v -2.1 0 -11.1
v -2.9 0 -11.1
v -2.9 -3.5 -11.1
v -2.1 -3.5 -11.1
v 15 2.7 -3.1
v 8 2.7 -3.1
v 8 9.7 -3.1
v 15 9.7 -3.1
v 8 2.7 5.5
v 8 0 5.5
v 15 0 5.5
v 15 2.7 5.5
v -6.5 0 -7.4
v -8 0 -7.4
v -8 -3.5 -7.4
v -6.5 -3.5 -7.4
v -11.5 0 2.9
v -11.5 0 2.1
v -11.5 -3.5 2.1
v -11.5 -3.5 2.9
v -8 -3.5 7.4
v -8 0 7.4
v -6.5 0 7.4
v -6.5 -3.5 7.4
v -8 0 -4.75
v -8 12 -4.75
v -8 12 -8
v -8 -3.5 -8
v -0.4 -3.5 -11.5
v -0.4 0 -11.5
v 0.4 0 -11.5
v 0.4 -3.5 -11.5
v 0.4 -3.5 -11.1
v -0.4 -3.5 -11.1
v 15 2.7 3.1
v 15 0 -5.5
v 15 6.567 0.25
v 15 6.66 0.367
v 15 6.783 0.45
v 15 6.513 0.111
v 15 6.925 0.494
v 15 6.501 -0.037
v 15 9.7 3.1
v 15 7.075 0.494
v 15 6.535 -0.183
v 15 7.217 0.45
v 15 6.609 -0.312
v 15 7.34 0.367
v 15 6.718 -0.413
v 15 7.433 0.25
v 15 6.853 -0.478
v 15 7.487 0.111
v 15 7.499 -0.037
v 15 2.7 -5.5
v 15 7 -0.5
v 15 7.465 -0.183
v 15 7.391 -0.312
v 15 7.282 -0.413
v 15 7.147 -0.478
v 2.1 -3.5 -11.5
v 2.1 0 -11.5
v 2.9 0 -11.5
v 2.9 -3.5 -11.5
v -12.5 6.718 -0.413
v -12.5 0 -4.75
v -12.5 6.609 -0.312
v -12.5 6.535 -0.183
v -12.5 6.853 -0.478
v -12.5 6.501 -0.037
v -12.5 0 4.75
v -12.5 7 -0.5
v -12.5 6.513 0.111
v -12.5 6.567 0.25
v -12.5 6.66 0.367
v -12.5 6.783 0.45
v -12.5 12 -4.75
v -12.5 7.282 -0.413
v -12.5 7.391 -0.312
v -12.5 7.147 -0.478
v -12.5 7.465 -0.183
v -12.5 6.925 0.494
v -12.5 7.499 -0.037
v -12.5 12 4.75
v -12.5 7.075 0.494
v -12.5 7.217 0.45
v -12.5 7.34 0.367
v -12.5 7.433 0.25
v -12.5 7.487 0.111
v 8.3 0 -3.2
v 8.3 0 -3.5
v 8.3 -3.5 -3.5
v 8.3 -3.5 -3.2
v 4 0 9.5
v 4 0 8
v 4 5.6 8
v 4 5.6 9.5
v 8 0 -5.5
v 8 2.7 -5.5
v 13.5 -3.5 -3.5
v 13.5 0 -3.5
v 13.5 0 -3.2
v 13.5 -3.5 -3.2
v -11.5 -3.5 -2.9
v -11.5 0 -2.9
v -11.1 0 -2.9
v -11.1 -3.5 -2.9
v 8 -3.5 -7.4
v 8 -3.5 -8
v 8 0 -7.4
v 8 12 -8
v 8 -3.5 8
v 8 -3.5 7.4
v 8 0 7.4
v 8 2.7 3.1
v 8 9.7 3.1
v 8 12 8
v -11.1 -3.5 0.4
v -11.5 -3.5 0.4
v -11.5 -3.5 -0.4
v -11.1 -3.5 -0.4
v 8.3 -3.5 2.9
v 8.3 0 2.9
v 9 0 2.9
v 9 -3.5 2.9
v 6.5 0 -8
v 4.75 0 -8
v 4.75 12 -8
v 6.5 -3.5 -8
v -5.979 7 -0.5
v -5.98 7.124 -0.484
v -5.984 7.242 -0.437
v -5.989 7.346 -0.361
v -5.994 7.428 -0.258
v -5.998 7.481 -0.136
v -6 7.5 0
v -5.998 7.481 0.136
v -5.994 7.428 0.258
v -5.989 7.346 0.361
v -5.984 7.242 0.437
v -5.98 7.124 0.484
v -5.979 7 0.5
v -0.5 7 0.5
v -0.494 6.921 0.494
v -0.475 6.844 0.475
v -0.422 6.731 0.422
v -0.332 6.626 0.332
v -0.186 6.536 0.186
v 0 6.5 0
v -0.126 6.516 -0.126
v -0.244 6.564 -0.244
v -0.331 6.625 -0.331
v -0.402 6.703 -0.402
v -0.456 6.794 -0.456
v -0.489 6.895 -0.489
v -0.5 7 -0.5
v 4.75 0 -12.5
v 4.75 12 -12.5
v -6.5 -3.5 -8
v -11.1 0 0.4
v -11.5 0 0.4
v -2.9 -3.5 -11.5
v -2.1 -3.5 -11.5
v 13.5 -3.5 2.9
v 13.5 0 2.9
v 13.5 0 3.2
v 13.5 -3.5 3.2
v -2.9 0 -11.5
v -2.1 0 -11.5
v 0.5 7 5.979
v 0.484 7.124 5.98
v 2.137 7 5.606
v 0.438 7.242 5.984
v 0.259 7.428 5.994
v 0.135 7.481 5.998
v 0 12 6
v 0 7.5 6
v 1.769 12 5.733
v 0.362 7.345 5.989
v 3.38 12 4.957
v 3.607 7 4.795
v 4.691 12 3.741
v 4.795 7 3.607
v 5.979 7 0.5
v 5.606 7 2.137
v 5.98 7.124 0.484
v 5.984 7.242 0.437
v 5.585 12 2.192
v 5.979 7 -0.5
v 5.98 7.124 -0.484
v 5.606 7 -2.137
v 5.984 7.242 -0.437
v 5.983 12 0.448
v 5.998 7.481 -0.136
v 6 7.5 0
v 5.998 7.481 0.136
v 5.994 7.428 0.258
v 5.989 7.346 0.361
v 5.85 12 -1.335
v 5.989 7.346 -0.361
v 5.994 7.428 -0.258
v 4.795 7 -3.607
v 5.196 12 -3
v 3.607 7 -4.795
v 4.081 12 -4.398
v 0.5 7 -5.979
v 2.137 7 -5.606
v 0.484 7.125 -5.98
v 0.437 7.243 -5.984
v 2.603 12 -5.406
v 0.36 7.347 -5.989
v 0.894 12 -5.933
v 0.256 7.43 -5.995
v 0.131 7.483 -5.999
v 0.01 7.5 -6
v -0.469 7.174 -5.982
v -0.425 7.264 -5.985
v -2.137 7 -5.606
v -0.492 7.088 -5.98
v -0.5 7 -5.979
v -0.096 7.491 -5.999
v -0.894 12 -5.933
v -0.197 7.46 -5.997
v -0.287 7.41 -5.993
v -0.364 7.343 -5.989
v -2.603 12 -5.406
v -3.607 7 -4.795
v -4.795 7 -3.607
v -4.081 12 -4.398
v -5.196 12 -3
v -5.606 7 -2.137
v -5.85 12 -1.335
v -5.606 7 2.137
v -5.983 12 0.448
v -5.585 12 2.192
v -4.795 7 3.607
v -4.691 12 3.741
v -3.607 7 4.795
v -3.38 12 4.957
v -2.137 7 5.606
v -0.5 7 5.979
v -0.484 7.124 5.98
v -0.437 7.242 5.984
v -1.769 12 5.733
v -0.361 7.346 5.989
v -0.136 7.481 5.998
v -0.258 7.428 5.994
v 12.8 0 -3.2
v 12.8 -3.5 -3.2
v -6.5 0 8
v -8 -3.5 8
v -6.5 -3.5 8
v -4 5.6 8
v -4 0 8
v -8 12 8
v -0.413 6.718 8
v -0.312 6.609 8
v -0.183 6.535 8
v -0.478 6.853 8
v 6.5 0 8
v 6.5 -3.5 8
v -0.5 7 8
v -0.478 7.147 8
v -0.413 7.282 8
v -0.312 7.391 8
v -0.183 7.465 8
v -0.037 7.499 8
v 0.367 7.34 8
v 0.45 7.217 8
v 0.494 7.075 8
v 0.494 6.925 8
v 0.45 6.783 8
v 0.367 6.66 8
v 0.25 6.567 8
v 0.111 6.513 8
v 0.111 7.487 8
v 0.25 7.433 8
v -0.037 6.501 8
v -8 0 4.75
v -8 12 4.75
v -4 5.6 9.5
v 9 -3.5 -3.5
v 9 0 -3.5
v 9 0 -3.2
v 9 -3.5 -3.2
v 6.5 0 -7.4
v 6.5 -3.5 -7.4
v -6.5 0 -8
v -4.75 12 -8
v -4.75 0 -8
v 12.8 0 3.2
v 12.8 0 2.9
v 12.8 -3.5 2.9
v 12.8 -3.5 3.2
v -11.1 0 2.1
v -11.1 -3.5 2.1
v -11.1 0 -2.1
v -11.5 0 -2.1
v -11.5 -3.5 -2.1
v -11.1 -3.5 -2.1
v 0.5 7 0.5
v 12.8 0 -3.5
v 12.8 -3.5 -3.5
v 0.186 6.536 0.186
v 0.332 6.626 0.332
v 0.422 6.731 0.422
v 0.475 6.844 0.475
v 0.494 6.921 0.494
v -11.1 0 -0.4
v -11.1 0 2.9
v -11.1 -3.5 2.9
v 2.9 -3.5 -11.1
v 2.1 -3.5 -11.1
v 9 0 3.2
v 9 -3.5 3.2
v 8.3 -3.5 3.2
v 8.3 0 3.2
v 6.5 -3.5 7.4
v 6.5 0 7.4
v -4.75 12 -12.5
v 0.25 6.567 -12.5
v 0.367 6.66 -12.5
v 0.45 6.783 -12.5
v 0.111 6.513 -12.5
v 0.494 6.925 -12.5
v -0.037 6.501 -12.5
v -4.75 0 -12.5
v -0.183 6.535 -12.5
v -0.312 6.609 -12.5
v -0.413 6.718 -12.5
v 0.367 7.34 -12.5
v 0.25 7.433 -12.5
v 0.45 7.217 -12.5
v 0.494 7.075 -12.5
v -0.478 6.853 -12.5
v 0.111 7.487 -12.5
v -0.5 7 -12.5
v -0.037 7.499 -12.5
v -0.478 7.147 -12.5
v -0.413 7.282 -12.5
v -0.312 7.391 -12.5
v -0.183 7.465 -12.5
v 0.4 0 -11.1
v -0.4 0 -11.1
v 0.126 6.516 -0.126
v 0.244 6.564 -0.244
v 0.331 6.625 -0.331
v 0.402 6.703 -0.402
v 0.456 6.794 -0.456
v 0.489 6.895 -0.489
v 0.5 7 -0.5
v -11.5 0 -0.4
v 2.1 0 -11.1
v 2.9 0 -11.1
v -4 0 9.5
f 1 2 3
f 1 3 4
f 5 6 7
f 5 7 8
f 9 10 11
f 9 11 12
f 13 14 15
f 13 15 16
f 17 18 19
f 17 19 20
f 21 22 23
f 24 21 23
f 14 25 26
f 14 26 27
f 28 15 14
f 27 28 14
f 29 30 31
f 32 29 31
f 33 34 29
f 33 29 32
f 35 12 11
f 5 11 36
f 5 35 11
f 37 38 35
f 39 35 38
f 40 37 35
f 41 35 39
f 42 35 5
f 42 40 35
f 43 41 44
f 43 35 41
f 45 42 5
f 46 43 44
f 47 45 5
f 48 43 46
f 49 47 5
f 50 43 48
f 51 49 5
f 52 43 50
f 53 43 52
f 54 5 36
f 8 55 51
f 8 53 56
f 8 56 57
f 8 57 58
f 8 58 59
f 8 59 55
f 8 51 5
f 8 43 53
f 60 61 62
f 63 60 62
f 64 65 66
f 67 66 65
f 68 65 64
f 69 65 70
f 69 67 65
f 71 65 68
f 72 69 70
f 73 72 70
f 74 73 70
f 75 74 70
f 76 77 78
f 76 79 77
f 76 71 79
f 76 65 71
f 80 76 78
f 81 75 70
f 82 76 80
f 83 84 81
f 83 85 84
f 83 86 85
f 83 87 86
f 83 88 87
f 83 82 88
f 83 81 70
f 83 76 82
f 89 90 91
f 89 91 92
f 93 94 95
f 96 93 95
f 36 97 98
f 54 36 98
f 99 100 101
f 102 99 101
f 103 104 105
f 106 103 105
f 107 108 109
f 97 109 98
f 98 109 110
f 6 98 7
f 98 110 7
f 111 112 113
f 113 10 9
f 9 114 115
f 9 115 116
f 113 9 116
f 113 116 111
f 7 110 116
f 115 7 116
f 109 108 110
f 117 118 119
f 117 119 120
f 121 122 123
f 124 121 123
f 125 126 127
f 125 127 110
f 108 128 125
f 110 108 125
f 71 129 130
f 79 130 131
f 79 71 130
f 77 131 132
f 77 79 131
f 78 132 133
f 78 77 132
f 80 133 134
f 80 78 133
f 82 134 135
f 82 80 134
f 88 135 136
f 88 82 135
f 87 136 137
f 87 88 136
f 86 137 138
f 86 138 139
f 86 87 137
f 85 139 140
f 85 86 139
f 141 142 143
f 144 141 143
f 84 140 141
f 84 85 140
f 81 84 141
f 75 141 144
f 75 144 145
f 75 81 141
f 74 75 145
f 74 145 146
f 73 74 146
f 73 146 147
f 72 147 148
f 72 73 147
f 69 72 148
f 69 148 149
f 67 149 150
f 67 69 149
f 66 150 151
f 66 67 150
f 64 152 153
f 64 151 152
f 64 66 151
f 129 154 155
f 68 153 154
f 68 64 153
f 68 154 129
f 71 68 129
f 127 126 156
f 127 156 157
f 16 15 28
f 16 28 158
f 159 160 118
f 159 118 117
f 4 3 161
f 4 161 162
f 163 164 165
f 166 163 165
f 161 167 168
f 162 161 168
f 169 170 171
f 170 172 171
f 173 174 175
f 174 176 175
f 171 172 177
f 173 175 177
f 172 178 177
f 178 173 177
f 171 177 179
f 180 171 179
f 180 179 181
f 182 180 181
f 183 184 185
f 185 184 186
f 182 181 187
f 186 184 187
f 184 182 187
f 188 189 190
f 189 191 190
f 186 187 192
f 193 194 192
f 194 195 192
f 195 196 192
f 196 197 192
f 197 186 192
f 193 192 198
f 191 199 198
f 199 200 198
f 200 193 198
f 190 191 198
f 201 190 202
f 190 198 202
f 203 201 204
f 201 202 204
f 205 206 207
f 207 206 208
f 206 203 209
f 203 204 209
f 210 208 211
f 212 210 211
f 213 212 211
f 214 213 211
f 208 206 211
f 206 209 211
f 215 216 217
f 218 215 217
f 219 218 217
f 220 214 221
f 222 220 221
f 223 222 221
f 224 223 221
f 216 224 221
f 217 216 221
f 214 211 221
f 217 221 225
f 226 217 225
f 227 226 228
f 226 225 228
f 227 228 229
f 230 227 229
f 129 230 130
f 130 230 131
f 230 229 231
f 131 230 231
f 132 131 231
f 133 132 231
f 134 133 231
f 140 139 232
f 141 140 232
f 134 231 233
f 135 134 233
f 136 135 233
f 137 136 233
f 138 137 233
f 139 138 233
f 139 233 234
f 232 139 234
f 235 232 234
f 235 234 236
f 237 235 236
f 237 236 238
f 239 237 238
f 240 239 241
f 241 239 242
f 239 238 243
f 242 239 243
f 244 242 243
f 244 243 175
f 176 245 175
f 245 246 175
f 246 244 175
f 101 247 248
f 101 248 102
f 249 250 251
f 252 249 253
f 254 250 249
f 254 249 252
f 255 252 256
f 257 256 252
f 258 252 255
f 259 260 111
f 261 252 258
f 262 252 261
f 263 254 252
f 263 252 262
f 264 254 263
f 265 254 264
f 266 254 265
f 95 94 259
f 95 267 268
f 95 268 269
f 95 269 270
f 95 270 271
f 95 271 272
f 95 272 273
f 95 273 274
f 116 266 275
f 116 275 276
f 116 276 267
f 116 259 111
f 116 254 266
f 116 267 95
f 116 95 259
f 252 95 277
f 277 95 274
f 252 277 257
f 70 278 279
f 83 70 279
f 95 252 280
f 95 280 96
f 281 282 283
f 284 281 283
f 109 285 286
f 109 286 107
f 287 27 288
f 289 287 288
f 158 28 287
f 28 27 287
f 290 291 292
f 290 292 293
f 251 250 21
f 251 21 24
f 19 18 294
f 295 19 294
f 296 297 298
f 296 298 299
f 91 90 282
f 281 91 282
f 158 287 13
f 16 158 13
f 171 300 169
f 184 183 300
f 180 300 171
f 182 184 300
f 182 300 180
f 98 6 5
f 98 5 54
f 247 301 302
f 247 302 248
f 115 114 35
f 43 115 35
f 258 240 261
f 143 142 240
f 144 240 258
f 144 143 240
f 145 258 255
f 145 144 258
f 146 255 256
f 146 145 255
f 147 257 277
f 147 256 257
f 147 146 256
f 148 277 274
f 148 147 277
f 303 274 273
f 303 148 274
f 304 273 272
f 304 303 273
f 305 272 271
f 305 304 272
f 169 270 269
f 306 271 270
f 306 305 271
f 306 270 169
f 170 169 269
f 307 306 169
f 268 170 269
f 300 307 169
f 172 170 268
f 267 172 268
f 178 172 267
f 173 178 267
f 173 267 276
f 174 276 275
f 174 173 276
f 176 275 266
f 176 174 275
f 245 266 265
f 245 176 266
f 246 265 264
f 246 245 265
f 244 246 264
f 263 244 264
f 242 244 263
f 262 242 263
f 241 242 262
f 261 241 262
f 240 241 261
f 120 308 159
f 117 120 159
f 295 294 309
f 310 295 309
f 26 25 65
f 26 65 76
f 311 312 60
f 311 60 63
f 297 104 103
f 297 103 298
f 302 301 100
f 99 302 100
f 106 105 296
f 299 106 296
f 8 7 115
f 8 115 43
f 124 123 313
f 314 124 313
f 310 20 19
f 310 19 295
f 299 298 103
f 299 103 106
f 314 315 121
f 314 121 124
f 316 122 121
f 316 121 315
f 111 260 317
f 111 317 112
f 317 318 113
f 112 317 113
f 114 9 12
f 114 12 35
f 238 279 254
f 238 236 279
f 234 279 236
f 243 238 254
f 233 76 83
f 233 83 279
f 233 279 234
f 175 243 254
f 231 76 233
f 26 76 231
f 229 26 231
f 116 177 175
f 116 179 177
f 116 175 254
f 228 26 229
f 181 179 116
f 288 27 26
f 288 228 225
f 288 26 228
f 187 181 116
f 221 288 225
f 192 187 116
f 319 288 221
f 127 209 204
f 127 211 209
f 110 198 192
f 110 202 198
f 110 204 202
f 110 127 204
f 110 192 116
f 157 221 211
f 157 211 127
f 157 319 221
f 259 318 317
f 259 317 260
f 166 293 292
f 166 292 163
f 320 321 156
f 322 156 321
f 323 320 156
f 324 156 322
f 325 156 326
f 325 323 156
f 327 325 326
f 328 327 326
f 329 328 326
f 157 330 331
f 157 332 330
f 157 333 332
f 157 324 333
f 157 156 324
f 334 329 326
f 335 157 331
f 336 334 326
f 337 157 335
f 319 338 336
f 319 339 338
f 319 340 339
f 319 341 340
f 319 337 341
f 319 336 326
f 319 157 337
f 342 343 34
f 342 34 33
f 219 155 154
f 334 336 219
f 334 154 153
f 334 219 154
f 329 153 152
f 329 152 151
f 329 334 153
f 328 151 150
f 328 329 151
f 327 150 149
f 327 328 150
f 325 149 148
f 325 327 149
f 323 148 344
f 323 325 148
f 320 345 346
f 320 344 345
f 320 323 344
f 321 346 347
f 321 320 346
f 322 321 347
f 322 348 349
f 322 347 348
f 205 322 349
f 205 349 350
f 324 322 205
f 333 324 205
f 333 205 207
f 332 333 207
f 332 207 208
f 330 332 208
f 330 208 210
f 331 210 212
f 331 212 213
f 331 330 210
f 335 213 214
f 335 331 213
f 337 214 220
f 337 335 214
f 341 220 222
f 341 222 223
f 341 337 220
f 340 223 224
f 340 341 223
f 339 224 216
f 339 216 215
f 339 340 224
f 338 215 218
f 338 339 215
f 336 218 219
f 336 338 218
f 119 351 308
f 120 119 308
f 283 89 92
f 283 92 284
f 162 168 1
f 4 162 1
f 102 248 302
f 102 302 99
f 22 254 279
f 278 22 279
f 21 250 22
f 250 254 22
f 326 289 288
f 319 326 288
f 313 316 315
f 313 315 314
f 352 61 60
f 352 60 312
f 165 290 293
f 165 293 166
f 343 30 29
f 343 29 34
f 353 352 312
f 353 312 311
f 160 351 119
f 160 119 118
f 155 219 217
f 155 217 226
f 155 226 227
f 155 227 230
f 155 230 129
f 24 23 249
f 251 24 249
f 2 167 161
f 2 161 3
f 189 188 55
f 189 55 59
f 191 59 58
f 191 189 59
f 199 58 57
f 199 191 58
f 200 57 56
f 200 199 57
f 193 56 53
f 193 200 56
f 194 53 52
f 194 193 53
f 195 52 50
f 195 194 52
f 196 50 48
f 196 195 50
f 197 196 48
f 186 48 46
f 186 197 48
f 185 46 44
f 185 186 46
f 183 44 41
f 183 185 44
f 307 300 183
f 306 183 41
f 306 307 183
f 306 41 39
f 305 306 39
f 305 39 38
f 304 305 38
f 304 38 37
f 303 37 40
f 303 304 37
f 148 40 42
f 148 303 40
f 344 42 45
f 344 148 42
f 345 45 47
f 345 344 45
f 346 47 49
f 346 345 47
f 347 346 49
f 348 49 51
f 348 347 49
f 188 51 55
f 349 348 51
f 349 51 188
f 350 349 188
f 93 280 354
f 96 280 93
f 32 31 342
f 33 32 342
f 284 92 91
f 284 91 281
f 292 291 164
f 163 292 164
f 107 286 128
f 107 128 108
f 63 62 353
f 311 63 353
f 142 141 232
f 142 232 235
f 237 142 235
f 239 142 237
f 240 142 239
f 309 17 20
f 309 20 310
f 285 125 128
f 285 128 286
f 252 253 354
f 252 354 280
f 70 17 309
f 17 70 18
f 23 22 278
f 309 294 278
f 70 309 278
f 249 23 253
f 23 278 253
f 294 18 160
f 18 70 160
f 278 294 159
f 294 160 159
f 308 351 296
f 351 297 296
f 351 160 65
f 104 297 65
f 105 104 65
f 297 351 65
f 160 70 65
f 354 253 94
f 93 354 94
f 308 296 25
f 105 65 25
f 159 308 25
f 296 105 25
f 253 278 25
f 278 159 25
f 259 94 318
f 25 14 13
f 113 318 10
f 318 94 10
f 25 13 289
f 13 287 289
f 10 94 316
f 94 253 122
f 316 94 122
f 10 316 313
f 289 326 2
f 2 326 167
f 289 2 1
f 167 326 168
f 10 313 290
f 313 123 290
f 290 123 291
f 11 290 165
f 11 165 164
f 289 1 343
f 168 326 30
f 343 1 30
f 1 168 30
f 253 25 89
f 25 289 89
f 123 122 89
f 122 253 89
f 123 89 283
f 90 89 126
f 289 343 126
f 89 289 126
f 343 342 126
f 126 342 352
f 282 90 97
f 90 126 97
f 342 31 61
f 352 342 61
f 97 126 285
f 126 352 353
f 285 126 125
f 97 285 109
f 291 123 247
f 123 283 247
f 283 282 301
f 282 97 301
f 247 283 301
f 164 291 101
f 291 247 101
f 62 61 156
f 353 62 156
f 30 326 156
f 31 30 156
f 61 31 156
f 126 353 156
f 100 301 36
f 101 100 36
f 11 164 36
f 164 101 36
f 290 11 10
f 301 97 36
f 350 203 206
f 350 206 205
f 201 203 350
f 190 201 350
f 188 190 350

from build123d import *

# Parameters (mm, degrees)
SKETCH1_W               = 16
SKETCH1_H               = 16
BOSS_EXTRUDE1_DEPTH     = 12
SKETCH2_W               = 9.5
SKETCH2_H               = 12
BOSS_EXTRUDE2_DEPTH     = 4.5
CIRPATTERN1_COUNT       = 2
CIRPATTERN1_ANGLE       = 90
SKETCH4_W               = 8
SKETCH4_H               = 5.6
BOSS_EXTRUDE3_DEPTH     = 1.5
SKETCH5_W               = 11
SKETCH5_H               = 2.7
BOSS_EXTRUDE4_DEPTH     = 7
SKETCH6_W               = 7
SKETCH6_H               = 6.2
BOSS_EXTRUDE5_DEPTH     = 7
SKETCH7_R               = 6
CUT_EXTRUDE1_DEPTH      = 5
CUT_EXTRUDE2_DEPTH      = 23.918333273
CUT_EXTRUDE2_DEPTH_BACK = 23.918333273
SKETCH8_R               = 0.5
CUT_EXTRUDE3_DEPTH      = 23.918333391
CUT_EXTRUDE3_DEPTH_BACK = 23.918333391
SKETCH9_R               = 0.5
SKETCH10_W              = 1.5
SKETCH10_H              = 0.6
SKETCH10_W_2            = 0.4
SKETCH10_H_2            = 0.8
SKETCH10_W_3            = 0.8
SKETCH10_H_3            = 0.4
SKETCH10_W_4            = 0.7
SKETCH10_H_4            = 0.3
BOSS_EXTRUDE6_DEPTH     = 3.5


with BuildPart() as part:
    # Sketch1 → Boss-Extrude1 (new body)
    with BuildSketch(Plane(origin=(0, 0, 0), x_dir=(1, 0, 0), z_dir=(0, 1, 0))):
        Rectangle(SKETCH1_W, SKETCH1_H)
    extrude(amount=BOSS_EXTRUDE1_DEPTH)

    # Sketch2 → Boss-Extrude2 (add)
    with BuildSketch(Plane.ZY.offset(8)):
        with Locations((0, 6)):
            Rectangle(SKETCH2_W, SKETCH2_H)
    boss_extrude2 = extrude(amount=BOSS_EXTRUDE2_DEPTH)

    # CirPattern1: Boss-Extrude2 ×2 about axis
    cirpattern1_axis = Axis((0, 12.6, 0), (0, -1, 0))
    for i in range(1, CIRPATTERN1_COUNT):
        add(boss_extrude2.rotate(cirpattern1_axis, i * CIRPATTERN1_ANGLE / (CIRPATTERN1_COUNT - 1)))

    # Sketch4 → Boss-Extrude3 (add)
    with BuildSketch(Plane.XY.offset(8)):
        with Locations((0, 2.8)):
            Rectangle(SKETCH4_W, SKETCH4_H)
    extrude(amount=BOSS_EXTRUDE3_DEPTH)

    # Sketch5 → Boss-Extrude4 (add)
    with BuildSketch(Plane(origin=(8, 0, 0), x_dir=(0, 0, -1), z_dir=(1, 0, 0))):
        with Locations((0, 1.35)):
            Rectangle(SKETCH5_W, SKETCH5_H)
    extrude(amount=BOSS_EXTRUDE4_DEPTH)

    # Sketch6 → Boss-Extrude5 (add)
    with BuildSketch(Plane(origin=(0, 2.7, 0), x_dir=(1, 0, 0), z_dir=(0, 1, 0))):
        with Locations((11.5, 0)):
            Rectangle(SKETCH6_W, SKETCH6_H)
    extrude(amount=BOSS_EXTRUDE5_DEPTH)

    # Sketch7 → Cut-Extrude1 (cut)
    with BuildSketch(Plane(origin=(0, 12, 0), x_dir=(1, 0, 0), z_dir=(0, 1, 0))):
        Circle(SKETCH7_R)
    extrude(amount=-CUT_EXTRUDE1_DEPTH, mode=Mode.SUBTRACT)

    # Sketch8 → Cut-Extrude2 (cut, two sides: drawn at the far end of the back side and taken through both)
    with BuildSketch(Plane(origin=(0, 0, 0), x_dir=(0, 0, -1), z_dir=(1, 0, 0)).offset(-CUT_EXTRUDE2_DEPTH_BACK)):
        with Locations((0, 7)):
            Circle(SKETCH8_R)
    extrude(amount=CUT_EXTRUDE2_DEPTH + CUT_EXTRUDE2_DEPTH_BACK, mode=Mode.SUBTRACT)

    # Sketch9 → Cut-Extrude3 (cut, two sides: drawn at the far end of the back side and taken through both)
    with BuildSketch(Plane.XY.offset(-CUT_EXTRUDE3_DEPTH_BACK)):
        with Locations((0, 7)):
            Circle(SKETCH9_R)
    extrude(amount=CUT_EXTRUDE3_DEPTH + CUT_EXTRUDE3_DEPTH_BACK, mode=Mode.SUBTRACT)

    # Sketch10 → Boss-Extrude6 (add)
    with BuildSketch(Plane.XZ):
        with Locations((7.25, 7.7)):
            Rectangle(SKETCH10_W, SKETCH10_H)
        with Locations((-7.25, 7.7)):
            Rectangle(SKETCH10_W, SKETCH10_H)
        with Locations((7.25, -7.7)):
            Rectangle(SKETCH10_W, SKETCH10_H)
        with Locations((-7.25, -7.7)):
            Rectangle(SKETCH10_W, SKETCH10_H)
        with Locations((-11.3, 0)):
            Rectangle(SKETCH10_W_2, SKETCH10_H_2)
        with Locations((-11.3, -2.5)):
            Rectangle(SKETCH10_W_2, SKETCH10_H_2)
        with Locations((-11.3, 2.5)):
            Rectangle(SKETCH10_W_2, SKETCH10_H_2)
        with Locations((-2.5, -11.3)):
            Rectangle(SKETCH10_W_3, SKETCH10_H_3)
        with Locations((0, -11.3)):
            Rectangle(SKETCH10_W_3, SKETCH10_H_3)
        with Locations((2.5, -11.3)):
            Rectangle(SKETCH10_W_3, SKETCH10_H_3)
        with Locations((13.15, -3.35)):
            Rectangle(SKETCH10_W_4, SKETCH10_H_4)
        with Locations((8.65, -3.35)):
            Rectangle(SKETCH10_W_4, SKETCH10_H_4)
        with Locations((8.65, 3.05)):
            Rectangle(SKETCH10_W_4, SKETCH10_H_4)
        with Locations((13.15, 3.05)):
            Rectangle(SKETCH10_W_4, SKETCH10_H_4)
    extrude(amount=BOSS_EXTRUDE6_DEPTH)


solid = part.part
